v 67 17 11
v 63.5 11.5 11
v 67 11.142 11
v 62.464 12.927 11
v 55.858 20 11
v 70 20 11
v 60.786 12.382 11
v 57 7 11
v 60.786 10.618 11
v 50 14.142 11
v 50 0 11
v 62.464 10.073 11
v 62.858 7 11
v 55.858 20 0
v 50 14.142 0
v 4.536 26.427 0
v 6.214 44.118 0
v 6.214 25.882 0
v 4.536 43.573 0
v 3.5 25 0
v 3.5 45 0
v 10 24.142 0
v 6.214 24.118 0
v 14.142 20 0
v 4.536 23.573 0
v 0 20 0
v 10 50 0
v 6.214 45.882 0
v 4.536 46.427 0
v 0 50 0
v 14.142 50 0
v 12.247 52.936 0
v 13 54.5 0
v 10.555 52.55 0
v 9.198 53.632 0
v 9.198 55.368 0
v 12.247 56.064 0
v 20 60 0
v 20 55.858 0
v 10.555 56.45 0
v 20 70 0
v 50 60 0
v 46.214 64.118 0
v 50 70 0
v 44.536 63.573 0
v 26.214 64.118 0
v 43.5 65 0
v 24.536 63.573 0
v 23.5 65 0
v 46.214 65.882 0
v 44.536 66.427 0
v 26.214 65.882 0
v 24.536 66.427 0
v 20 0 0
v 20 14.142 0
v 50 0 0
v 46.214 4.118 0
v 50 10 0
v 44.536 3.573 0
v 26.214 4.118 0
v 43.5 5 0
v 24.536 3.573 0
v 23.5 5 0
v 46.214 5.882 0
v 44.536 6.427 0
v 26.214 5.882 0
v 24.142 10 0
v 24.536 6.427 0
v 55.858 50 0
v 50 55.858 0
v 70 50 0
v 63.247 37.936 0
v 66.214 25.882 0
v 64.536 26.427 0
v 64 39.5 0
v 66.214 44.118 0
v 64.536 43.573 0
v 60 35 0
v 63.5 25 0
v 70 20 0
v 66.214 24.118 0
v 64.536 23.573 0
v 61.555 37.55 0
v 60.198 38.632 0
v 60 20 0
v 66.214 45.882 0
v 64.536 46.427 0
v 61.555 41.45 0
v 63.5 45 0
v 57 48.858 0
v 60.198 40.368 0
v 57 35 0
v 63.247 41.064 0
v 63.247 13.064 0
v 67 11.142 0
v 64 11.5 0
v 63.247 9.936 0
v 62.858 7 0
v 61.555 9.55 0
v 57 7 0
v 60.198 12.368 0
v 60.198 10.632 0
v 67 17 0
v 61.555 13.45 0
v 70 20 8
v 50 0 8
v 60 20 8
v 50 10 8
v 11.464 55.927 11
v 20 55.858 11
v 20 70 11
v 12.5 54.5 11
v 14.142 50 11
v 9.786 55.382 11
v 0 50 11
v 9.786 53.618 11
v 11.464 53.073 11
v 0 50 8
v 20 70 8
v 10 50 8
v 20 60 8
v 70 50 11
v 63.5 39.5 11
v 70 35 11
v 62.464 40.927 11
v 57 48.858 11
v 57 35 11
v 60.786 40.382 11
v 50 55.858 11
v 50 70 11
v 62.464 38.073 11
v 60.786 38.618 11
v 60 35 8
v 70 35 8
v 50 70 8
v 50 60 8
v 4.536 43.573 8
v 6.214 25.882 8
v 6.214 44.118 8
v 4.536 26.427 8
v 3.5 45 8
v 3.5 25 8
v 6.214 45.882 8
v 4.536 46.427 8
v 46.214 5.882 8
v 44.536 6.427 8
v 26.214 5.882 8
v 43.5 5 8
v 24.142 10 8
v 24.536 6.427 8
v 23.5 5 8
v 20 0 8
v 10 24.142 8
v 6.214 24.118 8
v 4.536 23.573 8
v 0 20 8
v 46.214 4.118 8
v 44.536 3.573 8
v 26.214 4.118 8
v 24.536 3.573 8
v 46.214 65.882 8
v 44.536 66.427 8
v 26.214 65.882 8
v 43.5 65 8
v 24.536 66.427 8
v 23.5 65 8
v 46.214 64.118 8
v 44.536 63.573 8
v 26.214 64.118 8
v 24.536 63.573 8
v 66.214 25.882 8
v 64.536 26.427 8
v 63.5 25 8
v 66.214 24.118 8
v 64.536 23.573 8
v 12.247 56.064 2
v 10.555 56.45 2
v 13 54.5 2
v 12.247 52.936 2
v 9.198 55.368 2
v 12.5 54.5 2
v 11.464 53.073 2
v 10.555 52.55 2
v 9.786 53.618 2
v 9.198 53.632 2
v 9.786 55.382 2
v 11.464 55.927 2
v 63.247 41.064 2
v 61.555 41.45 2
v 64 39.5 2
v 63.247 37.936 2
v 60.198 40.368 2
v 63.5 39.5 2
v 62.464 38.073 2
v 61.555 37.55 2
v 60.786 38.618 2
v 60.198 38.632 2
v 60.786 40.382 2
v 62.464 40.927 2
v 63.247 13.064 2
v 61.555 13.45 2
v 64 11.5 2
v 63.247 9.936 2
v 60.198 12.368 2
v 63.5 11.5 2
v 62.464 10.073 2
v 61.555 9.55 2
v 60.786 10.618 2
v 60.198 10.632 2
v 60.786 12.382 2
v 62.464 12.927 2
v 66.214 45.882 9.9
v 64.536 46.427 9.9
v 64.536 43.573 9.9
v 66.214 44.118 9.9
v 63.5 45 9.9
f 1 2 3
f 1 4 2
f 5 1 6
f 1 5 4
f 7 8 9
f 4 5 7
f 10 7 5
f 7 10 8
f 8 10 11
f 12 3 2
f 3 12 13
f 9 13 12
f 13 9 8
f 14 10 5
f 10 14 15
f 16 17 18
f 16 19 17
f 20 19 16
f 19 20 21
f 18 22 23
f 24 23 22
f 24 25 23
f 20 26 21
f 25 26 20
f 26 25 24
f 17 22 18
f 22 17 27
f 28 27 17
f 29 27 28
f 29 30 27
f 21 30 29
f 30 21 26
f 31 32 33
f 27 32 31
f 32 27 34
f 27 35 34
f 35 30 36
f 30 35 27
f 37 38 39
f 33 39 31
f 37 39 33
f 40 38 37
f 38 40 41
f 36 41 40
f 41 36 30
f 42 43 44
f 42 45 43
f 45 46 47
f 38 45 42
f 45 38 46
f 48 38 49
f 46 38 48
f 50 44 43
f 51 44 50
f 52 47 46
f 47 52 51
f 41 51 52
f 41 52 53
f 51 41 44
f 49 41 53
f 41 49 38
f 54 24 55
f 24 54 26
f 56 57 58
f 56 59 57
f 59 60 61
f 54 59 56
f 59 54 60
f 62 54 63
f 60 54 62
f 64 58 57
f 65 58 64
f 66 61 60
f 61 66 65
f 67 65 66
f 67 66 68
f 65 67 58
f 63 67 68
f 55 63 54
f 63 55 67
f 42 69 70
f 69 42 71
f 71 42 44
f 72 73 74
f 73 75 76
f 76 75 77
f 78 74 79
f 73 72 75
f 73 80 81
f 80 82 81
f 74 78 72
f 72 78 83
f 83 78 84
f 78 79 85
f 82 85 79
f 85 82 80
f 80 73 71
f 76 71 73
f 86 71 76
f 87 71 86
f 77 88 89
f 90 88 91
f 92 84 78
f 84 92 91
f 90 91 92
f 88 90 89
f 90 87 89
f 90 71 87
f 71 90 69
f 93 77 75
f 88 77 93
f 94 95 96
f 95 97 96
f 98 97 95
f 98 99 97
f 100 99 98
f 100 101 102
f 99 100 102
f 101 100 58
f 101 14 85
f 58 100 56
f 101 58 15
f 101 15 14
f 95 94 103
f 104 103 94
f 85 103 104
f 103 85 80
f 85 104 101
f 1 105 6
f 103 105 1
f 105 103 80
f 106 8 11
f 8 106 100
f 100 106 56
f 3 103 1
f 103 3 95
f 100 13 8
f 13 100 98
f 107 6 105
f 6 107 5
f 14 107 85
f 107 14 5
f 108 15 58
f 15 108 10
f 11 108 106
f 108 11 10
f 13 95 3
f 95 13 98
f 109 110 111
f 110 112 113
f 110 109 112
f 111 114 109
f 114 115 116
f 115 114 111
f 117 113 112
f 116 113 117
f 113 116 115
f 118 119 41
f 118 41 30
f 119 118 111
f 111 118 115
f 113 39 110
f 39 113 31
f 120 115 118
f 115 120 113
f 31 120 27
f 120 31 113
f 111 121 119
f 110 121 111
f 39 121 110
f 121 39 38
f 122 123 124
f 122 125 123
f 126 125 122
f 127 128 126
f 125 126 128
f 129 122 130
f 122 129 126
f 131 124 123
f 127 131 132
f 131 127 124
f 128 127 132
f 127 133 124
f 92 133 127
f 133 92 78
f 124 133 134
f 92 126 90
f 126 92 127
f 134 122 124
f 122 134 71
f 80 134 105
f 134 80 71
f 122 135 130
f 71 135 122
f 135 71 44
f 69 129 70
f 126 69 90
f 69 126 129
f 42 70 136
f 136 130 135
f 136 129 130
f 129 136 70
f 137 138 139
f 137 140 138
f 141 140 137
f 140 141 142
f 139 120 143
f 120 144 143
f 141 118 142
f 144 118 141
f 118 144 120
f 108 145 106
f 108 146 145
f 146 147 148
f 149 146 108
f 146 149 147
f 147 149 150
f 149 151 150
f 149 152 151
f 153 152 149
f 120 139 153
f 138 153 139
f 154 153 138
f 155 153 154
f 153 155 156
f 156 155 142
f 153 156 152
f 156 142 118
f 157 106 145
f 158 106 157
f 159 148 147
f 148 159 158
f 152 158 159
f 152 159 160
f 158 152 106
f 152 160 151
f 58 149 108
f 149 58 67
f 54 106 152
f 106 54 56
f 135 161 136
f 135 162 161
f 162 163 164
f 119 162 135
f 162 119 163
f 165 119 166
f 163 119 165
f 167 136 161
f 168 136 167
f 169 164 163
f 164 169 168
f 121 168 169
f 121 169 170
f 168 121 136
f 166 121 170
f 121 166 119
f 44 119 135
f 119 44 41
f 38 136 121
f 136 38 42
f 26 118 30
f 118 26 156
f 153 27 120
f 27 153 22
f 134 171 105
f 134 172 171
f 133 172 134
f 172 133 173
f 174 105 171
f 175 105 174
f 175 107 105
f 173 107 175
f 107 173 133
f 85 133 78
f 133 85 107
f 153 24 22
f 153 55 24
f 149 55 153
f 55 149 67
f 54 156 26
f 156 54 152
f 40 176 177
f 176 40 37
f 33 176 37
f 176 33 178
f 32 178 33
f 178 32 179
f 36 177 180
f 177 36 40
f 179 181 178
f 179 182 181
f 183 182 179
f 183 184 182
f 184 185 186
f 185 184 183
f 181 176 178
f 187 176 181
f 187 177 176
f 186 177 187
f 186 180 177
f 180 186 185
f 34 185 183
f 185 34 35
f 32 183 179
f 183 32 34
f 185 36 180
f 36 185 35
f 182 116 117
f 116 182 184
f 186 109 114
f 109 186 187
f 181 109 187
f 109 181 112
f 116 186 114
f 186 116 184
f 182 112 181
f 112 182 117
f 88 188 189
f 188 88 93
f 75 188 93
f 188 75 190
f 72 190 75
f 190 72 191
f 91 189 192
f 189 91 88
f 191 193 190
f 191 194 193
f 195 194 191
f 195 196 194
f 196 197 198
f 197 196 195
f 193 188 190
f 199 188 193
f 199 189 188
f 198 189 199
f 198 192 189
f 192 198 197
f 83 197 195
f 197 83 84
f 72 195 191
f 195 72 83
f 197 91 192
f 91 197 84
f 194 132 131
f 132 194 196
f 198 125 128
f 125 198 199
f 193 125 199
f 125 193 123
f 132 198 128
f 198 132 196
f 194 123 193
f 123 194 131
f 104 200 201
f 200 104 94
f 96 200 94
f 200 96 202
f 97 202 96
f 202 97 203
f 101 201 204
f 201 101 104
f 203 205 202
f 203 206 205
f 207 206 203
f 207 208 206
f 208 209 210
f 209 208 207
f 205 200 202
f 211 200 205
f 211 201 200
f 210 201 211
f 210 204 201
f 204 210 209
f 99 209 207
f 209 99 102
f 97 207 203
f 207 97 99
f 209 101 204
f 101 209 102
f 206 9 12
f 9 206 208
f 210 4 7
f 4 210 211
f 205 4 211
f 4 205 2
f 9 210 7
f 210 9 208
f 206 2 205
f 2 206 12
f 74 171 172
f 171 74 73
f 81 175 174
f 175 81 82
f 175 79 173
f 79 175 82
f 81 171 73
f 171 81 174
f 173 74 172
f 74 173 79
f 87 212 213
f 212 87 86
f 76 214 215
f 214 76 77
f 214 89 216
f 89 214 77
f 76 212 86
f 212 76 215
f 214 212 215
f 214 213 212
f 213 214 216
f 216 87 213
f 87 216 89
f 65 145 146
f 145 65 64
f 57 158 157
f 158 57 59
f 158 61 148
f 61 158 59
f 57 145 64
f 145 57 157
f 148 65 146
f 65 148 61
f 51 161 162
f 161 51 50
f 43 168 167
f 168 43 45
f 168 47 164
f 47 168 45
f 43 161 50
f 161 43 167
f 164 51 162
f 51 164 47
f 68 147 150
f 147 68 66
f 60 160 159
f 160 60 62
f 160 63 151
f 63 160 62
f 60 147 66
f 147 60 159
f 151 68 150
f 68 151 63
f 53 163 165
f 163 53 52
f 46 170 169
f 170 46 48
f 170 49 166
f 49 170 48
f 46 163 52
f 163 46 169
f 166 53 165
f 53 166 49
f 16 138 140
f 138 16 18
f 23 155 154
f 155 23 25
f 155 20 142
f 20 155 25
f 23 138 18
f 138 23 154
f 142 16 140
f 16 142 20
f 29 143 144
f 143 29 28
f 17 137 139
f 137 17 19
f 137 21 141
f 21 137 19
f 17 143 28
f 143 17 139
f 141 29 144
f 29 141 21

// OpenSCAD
// file: arduino.scad
use <hardware.scad>

module arduino(with_screws=0) {
	module screws() {
		module screw(h=16) {
				union() {
						m2(h);
						translate(v=[0,0,h]) rotate(v=[1,0,0],a=180) m2(h);
				}
		}
		translate(v=[14,49.5,-12]) screw();
		translate(v=[65,34.5,-12]) screw();
		translate(v=[65,6.5,-12]) screw();
	}

	difference() {	
		union() {
			color([0,0.4,0.6,1]) cube([69,53.5,2]);

			// USB Port
			color([0.8,0.8,0.8]) translate(v=[-6.5,32.5,2]) cube([16.5,12.5,10.8]);

			// Power / Analog headers
			color([0,0,0]) translate(v=[31,1,0]) cube([33.5, 3, 10.2]);

			// Digital IO headers
			color([0,0,0]) translate(v=[22,49.5,0]) cube([43.5, 3, 10.2]);

			// IC and socket
			color([0,0,0]) translate(v=[28,11.4,0]) cube([35.5,10,9]);

			// ICSP header
			color([0,0,0]) translate(v=[63,24,0]) cube([5,7.5,10.5]);

			// DC barrel jack
			color([0,0,0]) translate(v=[-2,3,2]) cube([14.25,9.25,11]);

			// Reset button
			color([0.9,0.9,0.9]) translate(v=[52,24,0]) cube(6);

			if (with_screws == 1) screws();
		}

		if (with_screws == 0) screws();
	}
}

arduino(1);
// file: hardware.scad
axle_r = 4.5;
axle_separation = 30;

module axle(h) {
	rotate(v=[-1,0,0], a=90) cylinder(r=axle_r, h=h, $fn=10);
}

module axlepair(h=100) {
	union() {
		axle(h);
		translate(v=[axle_separation, 0, 0]) axle(h);
	}
}

module m2(h=16) {
	union() {
		cylinder(r=2, h=2);
		cylinder(r=1.5, h=h);
	}
}

module m3(h=16) {
	union() {
		cylinder(r=3.25, h=3);
		cylinder(r=2, h=h);
	}
}

module m5(h=16) {
	union() {
		cylinder(r=4.5, h=5);
		cylinder(r=3, h=h);
	}
}
// file: brock_a.scad
include <hardware.scad>

module brock_a(with_screws=0) {
	h = 1.3 * axle_r;
	corner = 20;
	width = 70;
	screw = 5;
	z_off = 6.1;
	m5_z_off = -5;

	difference() {
		union() {
			cube([width, width, h]);
			if (with_screws == 1) {
				for (x=[corner+screw, width-(corner+screw)])
					for (y=[corner+screw, width-(corner+screw)])
						translate(v=[x,y,m5_z_off]) m5();
				for (v = [[screw, corner+screw, z_off],
						[screw, width-(corner+screw), z_off],
						[corner+screw, screw, z_off],
						[corner+screw, width-screw, z_off],
						[width-(corner+screw), screw, z_off],
						[width-(corner+screw), width-screw, z_off],
						[width-screw, corner+screw, z_off],
						[width-screw, width-(corner+screw), z_off]])
					translate(v=v) rotate(v=[1,0,0], 180) m2();
			}
		}

		for (v = [[0,0,0],[width-corner,0,0],
				[0,width-corner,0],[width-corner,width-corner,0]]) 
			translate(v=v) cube([corner, corner, h]);

		
		if (with_screws == 0) {
			for (v = [[screw, corner+screw, z_off],
					[screw, width-(corner+screw), z_off],
					[corner+screw, screw, z_off],
					[corner+screw, width-screw, z_off],
					[width-(corner+screw), screw, z_off],
					[width-(corner+screw), width-screw, z_off],
					[width-screw, corner+screw, z_off],
					[width-screw, width-(corner+screw), z_off]])
				translate(v=v) rotate(v=[1,0,0], 180) m2();

			for (x=[corner+screw, width-(corner+screw)])
				for (y=[corner+screw, width-(corner+screw)])
					translate(v=[x,y,m5_z_off]) m5();
		}

		translate(v=[width/2,-0.5,h]) axle(h=width+1);
	}
}

brock_a();
// main file
use <brock_a.scad>
use <hardware.scad>
use <arduino.scad>

module benedict() {
	width = 70;
	bar = 10;
	corner = 20;
	height = 8;
	offset = 3;

	difference() {
		union() {
			// OUTER GRID BARS
			// South
			translate(v=[corner,0,0]) bar();
			// North
			translate(v=[corner,width-bar,0]) bar();
			// West
 			translate(v=[bar,corner,0]) rotate(90) bar();
			// East
			translate(v=[width,corner,0]) rotate(90) bar();

			// CORNER ANGLE BARS
			// Southeast
			difference() {
				union() {
					translate(v=[width-corner,0,0]) anglebar(height + offset);
					translate(v=[width-corner+7,7,0]) cube([bar, bar, height+offset]);
				}
				translate(v=[width,corner,0]) rotate(90) 
					cube([width - 2 * corner, bar*2, height + offset]);
				translate(v=[corner,0,0]) cube([width - 2 * corner, bar*2, height + offset]);
				translate(v=[width-corner+10,-10,0]) anglebar(height + offset);
			}

			// Southwest
			translate(v=[0,corner,0]) rotate(-90) anglebar();

			// Northwest
			difference() {
				translate(v=[corner,width,0]) rotate(180) anglebar(height + offset);
				translate(v=[bar*2,corner,0]) rotate(90)
					cube([width - 2 * corner, bar*2, height + offset]);
				translate(v=[corner,width-2*bar,0]) 
					cube([width - 2 * corner, bar*2, height + offset]);
			}

			// Northeast
			difference() {
				union() {
					translate(v=[width, width / 2,0]) rotate(90) 
						cube([width / 2 - corner, bar + 3, height + offset]);
					translate(v=[width,width-corner,0]) rotate(90) anglebar(height + offset);
				}
				translate(v=[corner,width-2*bar,0]) 
					cube([width - 2 * corner, bar*2, height + offset]);
			}
		}

		// Arduino
		translate(v=[-3,5,12]) rotate(0) arduino(1);
		// Brock A attachment
		translate(v=[70,0,0]) rotate(v=[0,1,0], a=180) brock_a(1);
	}

	module bar(h=height) {
		cube([width - 2 * corner, bar, h]);
	}

	module anglebar(h=height) {
		rotate(45) cube([sqrt(2)*corner, bar, h]);
	}
}

benedict();
